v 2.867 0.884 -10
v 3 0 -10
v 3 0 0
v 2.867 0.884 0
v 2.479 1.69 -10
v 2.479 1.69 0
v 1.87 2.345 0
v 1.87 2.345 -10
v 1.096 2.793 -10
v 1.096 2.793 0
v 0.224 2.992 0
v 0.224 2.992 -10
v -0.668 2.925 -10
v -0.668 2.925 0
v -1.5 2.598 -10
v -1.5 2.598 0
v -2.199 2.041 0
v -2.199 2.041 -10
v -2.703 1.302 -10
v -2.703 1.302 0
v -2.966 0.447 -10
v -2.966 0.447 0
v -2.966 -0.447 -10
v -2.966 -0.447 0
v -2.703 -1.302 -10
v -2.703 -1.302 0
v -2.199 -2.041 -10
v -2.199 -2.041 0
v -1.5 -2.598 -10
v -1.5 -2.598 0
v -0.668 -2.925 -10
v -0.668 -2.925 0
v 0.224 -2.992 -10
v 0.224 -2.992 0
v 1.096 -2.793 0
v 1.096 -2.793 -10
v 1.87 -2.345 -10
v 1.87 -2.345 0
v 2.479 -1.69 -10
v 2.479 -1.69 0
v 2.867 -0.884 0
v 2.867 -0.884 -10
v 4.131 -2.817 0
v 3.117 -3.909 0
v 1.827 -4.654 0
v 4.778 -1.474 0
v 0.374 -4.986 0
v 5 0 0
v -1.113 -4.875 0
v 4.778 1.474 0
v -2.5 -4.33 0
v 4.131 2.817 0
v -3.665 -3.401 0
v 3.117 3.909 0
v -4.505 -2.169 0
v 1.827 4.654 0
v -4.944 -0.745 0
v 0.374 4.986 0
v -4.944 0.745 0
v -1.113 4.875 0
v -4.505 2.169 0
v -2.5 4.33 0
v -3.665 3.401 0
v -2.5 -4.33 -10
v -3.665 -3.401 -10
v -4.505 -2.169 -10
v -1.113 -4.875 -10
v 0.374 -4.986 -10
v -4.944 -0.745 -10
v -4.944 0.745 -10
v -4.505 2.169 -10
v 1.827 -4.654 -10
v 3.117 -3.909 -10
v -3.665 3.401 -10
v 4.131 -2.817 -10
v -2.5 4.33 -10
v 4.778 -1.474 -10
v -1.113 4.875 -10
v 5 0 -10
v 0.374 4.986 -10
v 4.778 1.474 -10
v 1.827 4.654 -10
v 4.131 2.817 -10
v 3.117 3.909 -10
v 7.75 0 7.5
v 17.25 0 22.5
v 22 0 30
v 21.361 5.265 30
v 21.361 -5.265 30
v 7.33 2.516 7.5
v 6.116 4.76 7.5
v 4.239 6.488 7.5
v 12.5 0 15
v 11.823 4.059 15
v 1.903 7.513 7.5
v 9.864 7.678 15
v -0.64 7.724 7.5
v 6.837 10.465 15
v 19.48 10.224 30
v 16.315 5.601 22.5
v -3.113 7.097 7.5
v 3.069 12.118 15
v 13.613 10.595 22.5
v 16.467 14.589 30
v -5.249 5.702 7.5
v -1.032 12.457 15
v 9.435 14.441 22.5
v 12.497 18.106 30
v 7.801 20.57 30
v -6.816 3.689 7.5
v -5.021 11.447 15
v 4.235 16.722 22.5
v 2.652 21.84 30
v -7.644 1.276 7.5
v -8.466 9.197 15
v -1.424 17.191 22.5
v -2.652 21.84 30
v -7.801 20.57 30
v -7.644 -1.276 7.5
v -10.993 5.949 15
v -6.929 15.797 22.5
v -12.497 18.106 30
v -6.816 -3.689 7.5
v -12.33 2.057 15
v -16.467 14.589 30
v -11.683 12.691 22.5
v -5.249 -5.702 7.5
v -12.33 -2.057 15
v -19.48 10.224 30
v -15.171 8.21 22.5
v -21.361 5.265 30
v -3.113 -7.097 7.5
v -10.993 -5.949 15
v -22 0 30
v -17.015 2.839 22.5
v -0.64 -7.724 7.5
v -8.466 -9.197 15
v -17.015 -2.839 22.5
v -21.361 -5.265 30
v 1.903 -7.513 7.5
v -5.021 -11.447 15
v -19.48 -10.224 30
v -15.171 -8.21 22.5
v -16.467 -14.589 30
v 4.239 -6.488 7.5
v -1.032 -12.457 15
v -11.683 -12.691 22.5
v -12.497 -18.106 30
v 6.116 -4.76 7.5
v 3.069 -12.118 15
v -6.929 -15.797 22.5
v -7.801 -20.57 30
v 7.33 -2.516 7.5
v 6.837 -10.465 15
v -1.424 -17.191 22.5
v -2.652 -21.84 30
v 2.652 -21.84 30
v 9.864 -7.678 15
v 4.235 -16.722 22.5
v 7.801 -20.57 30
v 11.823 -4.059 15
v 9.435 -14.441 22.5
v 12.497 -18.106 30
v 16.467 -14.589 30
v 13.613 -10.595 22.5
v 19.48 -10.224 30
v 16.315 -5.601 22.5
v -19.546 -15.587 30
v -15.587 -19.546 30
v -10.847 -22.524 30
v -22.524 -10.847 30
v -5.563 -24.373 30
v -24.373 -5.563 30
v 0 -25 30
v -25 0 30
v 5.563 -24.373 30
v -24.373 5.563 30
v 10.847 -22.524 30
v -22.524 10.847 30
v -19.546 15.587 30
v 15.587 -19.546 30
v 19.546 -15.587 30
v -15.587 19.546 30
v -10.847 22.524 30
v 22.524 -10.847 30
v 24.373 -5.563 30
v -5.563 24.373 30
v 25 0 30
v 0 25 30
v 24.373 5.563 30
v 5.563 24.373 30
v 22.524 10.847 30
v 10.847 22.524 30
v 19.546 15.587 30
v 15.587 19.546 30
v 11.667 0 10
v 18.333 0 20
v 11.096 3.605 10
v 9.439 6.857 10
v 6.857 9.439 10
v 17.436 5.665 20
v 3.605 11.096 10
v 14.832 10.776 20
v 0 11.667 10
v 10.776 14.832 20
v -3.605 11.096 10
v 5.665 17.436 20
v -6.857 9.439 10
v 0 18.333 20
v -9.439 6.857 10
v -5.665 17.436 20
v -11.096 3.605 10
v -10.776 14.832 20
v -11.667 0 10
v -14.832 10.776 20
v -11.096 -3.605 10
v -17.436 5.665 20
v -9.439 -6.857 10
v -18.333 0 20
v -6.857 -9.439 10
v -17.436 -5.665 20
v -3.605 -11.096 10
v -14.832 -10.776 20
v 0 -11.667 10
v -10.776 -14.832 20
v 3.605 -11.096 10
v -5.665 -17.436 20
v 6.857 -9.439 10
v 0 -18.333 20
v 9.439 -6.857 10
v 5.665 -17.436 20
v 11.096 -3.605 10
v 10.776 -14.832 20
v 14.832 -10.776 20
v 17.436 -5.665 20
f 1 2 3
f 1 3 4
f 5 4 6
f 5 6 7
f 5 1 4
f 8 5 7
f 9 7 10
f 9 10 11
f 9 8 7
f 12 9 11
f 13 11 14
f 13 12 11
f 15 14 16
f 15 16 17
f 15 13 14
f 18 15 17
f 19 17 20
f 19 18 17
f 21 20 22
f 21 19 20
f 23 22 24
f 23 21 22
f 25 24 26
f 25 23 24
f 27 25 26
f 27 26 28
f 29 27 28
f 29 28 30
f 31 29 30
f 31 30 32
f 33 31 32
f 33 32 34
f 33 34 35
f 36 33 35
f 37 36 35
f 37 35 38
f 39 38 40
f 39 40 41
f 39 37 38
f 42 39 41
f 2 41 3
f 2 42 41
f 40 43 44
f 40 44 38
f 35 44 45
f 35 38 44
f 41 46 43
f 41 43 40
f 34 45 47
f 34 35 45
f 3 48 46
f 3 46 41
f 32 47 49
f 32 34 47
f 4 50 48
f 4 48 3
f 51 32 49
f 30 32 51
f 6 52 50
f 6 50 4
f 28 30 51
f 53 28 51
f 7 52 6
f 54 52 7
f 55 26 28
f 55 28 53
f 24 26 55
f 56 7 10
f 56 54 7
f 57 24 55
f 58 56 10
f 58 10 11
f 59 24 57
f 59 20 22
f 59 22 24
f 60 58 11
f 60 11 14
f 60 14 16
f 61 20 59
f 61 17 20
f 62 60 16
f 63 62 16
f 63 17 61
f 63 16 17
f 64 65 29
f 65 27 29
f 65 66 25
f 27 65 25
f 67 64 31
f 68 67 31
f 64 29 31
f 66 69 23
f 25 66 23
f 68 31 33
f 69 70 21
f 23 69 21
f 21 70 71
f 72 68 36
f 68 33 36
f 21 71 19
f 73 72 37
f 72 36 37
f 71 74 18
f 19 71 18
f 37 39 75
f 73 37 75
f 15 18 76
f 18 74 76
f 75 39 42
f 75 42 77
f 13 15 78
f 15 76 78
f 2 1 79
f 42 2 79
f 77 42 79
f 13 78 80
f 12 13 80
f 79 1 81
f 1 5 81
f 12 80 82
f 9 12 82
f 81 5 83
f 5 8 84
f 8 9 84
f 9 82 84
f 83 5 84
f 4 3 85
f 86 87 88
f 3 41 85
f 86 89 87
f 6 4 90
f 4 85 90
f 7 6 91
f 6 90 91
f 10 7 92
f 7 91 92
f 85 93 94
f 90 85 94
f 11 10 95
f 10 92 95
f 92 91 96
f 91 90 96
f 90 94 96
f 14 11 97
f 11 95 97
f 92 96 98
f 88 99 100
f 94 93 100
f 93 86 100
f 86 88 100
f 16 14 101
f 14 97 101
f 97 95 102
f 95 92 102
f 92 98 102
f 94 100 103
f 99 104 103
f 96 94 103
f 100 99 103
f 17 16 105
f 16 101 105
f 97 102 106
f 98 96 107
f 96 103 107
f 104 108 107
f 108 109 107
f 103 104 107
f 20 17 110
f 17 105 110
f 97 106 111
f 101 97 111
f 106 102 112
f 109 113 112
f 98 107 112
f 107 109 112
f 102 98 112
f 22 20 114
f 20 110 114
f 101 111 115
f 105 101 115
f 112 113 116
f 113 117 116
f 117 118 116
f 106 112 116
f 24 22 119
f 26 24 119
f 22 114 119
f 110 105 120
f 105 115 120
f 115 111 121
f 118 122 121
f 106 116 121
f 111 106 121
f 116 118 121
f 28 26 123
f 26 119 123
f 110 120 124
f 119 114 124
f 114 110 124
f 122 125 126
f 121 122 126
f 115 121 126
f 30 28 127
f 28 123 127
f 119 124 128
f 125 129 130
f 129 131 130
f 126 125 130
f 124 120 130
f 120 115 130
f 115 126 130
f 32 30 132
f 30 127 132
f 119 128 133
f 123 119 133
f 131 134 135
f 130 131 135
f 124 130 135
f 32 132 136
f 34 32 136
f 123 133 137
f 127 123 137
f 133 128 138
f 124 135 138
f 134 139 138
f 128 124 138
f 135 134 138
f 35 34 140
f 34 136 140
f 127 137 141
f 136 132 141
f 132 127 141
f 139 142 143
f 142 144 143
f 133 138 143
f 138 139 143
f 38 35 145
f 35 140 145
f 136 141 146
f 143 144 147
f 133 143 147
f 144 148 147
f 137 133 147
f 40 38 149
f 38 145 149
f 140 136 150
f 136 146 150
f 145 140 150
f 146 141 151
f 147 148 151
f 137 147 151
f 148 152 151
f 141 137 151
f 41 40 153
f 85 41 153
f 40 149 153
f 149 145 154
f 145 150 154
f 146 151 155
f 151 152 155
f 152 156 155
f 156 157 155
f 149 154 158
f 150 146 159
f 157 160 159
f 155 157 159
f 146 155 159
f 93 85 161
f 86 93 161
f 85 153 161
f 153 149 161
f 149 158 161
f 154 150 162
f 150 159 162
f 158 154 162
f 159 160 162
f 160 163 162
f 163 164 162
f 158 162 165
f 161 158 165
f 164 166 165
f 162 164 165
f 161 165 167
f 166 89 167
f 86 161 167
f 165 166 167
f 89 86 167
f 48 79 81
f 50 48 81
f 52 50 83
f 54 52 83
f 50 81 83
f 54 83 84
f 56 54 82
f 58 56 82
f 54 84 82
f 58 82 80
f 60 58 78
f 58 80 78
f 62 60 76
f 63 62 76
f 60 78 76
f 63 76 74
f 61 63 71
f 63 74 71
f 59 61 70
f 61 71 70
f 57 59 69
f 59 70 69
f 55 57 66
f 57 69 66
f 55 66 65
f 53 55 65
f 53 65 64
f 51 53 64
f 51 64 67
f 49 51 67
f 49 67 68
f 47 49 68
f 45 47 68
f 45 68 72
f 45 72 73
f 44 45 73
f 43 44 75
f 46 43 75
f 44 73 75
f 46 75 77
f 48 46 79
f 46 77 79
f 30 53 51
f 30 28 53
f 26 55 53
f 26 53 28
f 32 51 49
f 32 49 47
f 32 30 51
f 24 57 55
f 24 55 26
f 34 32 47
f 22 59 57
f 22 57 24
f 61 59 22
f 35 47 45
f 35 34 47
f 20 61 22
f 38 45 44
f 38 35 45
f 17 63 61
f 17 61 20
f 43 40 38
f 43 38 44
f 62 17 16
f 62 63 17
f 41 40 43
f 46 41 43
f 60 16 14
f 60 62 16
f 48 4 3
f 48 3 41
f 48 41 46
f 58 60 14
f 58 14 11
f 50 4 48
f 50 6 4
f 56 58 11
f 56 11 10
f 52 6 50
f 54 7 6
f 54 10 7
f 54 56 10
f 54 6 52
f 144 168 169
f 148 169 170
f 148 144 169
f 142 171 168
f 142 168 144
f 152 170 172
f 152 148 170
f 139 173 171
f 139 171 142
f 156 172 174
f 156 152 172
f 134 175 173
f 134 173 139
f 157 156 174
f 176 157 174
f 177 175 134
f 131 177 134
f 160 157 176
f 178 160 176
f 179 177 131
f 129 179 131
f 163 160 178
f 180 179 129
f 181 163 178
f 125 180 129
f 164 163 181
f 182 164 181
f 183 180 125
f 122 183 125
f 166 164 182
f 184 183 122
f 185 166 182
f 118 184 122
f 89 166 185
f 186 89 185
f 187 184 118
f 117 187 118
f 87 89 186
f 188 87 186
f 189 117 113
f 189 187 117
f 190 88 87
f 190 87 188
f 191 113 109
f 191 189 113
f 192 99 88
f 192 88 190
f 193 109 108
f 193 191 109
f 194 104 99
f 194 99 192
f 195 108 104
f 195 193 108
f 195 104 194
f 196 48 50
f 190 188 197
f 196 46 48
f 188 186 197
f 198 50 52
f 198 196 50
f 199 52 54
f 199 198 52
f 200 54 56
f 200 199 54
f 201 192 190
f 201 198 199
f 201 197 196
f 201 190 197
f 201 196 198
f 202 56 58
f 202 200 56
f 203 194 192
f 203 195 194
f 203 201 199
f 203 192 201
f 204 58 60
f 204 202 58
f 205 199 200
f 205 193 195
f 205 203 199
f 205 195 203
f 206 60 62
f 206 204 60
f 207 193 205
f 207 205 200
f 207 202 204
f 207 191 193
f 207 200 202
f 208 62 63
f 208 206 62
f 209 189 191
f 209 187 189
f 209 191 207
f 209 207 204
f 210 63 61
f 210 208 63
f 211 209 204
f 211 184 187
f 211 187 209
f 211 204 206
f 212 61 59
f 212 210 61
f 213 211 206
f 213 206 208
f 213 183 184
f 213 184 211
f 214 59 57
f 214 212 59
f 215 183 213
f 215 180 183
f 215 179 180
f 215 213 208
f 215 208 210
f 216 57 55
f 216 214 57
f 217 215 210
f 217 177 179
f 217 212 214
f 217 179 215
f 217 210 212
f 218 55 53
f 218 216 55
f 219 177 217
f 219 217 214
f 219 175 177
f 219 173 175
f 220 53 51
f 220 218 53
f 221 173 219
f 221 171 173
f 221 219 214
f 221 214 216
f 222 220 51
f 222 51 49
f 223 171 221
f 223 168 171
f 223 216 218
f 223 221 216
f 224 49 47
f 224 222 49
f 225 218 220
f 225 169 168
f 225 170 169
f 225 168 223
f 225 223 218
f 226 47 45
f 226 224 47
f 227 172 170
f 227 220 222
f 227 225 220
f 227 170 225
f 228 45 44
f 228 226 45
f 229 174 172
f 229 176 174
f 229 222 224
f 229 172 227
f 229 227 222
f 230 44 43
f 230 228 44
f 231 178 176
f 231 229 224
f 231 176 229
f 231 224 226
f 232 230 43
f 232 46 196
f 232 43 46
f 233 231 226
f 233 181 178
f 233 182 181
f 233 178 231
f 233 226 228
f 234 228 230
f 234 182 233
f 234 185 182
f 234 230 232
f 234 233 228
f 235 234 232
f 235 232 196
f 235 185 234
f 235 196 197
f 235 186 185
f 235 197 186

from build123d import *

# Parameters (mm, degrees)
CYLINDER001_R     = 3
CYLINDER001_DEPTH = 10
CYLINDER_R        = 5
CYLINDER_DEPTH    = 10


with BuildPart() as cono001:
    # Cone001 → Cone001 (revolve)
    with BuildSketch(Plane.XZ):
        Polygon((0, 0), (3, 0), (22, 30), (0, 30), align=None)
    revolve(axis=Axis((0, 0, 0), (0, 0, 1)))


with BuildPart() as cut:
    # Cone → Cone (revolve)
    with BuildSketch(Plane.XZ):
        Polygon((0, 0), (5, 0), (25, 30), (0, 30), align=None)
    revolve(axis=Axis((0, 0, 0), (0, 0, 1)))

    # Cut: cut Cono001
    add(cono001.part, mode=Mode.SUBTRACT)


with BuildPart() as cilindro001:
    # Cylinder001 → Cylinder001 (new body)
    with BuildSketch(Plane.XY.offset(-10)):
        Circle(CYLINDER001_R)
    extrude(amount=CYLINDER001_DEPTH)


with BuildPart() as cut001:
    # Cylinder → Cylinder (new body)
    with BuildSketch(Plane.XY.offset(-10)):
        Circle(CYLINDER_R)
    extrude(amount=CYLINDER_DEPTH)

    # Cut001: cut Cilindro001
    add(cilindro001.part, mode=Mode.SUBTRACT)


solid = Compound([cut.part, cut001.part])
